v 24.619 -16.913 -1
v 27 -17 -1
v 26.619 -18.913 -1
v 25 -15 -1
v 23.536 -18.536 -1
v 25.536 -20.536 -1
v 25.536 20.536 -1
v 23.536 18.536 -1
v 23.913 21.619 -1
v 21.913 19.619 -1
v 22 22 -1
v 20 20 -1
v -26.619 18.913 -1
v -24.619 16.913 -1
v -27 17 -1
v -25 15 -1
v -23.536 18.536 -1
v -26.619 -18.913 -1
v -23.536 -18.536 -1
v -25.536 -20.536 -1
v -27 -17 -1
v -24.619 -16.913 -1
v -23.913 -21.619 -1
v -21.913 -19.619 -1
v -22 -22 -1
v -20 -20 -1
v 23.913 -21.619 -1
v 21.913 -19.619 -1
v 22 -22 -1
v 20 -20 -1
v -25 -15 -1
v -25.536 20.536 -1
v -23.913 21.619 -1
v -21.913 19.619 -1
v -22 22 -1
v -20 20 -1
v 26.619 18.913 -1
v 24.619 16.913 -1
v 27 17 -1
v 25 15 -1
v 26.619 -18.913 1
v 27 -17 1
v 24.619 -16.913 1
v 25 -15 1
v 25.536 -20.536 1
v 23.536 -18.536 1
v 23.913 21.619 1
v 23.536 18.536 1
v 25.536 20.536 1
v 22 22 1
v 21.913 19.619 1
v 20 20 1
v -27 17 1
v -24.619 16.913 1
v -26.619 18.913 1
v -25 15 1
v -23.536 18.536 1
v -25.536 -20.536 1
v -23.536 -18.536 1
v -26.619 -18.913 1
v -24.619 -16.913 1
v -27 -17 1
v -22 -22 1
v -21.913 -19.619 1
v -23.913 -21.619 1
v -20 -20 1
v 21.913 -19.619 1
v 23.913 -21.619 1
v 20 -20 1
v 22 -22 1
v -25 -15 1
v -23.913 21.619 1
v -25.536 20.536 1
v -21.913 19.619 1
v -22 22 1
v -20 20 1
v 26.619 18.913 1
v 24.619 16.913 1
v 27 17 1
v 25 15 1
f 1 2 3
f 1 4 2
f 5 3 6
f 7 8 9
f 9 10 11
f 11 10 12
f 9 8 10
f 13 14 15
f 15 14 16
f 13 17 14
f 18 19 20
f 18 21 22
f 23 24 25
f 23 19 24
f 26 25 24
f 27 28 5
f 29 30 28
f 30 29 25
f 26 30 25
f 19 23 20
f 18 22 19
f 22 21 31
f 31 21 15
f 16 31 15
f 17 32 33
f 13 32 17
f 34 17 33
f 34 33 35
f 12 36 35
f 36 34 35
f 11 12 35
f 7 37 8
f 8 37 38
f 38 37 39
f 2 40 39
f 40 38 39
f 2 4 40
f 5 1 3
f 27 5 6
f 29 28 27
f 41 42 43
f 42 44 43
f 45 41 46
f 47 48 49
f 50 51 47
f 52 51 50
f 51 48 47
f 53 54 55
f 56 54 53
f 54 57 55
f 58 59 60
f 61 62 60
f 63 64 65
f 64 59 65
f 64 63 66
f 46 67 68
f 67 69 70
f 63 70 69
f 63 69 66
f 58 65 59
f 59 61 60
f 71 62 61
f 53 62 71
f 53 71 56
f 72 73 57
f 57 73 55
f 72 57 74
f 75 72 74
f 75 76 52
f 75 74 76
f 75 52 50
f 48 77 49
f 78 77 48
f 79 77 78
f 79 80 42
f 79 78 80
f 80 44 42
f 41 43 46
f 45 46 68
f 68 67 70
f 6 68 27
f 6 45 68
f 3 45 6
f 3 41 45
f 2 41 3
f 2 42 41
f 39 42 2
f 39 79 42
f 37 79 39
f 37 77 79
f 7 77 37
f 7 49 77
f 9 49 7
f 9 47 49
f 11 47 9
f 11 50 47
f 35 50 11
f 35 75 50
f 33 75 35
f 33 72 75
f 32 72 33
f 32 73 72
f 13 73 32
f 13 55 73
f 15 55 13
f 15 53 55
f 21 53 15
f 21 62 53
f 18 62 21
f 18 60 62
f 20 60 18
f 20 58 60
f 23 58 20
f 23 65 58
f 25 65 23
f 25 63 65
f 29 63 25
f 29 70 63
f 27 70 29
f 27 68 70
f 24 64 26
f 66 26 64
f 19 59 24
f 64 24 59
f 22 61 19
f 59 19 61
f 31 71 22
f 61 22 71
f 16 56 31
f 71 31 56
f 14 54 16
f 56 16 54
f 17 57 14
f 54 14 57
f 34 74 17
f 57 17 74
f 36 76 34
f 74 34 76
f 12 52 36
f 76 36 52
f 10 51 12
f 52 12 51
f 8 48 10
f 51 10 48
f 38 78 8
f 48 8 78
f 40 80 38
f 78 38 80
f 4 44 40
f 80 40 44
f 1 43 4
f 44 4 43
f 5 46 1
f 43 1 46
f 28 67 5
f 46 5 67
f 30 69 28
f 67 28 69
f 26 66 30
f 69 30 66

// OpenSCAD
boxRibTest();
module boxRibTest(){
    boxRib(50, 40, 2, 5);
}

module roundedRectangle(w, h, r){
    minkowski(){
        square([w-2*r, h-2*r], center=true);
        circle(r);
    }
}

module boxRib(w, h, t, r){
    translate([0, 0, -t/2])
        linear_extrude(height = t)
            difference(){
                roundedRectangle(w+2*t, h+2*t, r);
                roundedRectangle(w, h, r);
            }        
}
    
